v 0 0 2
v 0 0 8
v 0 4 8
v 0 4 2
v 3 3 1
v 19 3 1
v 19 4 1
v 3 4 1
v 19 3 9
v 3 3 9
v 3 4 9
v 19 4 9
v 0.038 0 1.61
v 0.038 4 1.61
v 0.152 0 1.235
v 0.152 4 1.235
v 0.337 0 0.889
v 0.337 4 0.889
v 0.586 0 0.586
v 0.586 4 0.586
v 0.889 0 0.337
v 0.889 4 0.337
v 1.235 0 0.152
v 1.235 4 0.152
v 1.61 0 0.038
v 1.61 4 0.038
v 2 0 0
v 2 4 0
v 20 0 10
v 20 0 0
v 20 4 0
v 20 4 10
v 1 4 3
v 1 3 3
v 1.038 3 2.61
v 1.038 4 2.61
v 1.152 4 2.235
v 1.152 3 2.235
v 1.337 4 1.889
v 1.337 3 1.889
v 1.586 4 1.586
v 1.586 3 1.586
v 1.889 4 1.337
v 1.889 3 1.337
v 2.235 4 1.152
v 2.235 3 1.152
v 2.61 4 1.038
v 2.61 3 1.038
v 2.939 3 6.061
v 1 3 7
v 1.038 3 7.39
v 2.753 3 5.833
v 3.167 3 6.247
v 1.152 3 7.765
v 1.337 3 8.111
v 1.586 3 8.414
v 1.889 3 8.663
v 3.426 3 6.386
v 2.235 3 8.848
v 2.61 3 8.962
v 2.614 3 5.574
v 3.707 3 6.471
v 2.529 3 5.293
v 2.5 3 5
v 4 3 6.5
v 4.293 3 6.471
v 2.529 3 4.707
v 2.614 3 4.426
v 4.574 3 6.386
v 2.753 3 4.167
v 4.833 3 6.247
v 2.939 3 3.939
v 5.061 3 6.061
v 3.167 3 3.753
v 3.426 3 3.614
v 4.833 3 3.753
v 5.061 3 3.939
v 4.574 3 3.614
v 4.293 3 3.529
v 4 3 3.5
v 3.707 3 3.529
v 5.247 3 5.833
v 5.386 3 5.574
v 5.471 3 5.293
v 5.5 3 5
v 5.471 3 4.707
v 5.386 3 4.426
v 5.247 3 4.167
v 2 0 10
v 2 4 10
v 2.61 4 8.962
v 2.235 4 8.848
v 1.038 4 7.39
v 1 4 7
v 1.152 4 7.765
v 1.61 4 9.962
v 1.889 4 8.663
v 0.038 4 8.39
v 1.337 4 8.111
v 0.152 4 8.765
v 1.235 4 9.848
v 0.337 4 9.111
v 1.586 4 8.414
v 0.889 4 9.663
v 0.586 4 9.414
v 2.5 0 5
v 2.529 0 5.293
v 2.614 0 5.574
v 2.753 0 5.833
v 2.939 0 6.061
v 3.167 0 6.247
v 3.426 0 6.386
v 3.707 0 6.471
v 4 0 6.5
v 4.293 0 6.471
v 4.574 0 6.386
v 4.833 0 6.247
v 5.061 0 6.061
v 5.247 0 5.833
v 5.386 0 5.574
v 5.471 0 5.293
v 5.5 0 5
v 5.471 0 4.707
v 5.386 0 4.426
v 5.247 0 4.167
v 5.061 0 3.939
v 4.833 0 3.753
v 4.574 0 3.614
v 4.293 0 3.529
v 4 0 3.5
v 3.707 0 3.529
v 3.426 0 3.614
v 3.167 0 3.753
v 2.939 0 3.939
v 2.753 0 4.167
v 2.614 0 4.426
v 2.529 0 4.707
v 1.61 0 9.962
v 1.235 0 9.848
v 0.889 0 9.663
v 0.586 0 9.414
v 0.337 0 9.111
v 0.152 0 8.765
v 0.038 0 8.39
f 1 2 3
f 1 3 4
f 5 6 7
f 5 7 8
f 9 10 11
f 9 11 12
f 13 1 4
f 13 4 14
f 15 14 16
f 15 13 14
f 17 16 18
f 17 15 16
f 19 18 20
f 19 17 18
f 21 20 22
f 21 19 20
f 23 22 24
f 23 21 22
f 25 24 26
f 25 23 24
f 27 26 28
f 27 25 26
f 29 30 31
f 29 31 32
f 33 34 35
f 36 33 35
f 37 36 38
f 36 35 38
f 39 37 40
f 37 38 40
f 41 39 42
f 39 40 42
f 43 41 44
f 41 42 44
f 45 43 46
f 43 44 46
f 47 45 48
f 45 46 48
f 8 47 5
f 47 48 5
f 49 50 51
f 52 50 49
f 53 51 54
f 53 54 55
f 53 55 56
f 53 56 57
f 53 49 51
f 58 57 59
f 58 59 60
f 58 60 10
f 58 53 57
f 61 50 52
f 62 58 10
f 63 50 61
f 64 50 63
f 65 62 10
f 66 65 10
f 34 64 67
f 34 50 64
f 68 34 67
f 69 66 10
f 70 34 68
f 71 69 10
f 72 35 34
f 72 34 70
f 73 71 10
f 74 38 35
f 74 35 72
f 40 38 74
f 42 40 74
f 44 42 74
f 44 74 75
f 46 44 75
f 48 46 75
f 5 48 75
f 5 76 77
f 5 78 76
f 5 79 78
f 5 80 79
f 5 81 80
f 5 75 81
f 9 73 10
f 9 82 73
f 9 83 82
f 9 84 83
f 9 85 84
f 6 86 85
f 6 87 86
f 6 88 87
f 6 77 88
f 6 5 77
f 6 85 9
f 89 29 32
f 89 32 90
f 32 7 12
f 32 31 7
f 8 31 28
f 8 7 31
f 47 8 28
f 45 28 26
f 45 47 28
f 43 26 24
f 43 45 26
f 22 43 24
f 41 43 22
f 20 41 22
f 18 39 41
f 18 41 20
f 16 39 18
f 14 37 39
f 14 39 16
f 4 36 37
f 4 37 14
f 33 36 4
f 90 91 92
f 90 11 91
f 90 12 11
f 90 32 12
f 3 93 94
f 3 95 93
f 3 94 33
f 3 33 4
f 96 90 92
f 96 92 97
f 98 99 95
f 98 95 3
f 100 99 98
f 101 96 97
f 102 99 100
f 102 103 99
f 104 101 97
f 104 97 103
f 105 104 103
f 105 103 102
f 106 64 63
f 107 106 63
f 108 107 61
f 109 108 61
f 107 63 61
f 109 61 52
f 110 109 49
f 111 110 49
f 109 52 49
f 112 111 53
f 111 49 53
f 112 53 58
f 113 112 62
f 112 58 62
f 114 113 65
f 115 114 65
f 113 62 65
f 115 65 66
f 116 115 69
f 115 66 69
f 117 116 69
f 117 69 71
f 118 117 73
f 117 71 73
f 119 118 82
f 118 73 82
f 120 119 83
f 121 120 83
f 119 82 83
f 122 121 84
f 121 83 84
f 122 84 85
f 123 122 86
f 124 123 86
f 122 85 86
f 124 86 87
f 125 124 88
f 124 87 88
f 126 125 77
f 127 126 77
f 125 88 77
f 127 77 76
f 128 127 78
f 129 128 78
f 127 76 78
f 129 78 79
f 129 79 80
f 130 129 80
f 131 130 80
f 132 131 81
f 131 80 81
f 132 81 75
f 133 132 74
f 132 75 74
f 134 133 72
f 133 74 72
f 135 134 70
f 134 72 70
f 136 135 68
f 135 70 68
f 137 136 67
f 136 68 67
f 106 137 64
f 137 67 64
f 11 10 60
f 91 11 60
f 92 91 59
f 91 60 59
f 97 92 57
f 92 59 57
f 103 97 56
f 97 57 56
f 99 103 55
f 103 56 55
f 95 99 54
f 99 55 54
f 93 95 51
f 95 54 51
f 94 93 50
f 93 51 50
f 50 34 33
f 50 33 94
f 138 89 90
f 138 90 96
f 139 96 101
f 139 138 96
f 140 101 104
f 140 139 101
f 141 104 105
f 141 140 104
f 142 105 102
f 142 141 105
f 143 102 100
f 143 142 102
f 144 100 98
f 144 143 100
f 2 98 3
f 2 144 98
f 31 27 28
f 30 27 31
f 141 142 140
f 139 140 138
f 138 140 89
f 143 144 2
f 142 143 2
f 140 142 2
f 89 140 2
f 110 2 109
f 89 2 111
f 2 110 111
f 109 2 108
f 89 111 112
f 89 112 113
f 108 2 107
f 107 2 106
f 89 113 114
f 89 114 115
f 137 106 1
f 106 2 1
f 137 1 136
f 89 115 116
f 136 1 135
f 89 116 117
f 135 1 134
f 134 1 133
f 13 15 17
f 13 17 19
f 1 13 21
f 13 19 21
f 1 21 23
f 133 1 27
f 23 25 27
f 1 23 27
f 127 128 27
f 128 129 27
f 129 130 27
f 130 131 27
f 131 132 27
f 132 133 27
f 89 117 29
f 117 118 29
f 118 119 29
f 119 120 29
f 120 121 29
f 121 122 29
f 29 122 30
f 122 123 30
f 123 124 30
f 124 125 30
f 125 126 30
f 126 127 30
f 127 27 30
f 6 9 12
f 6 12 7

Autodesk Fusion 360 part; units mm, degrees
sketch "Sketch1" plane through (0, 0, 0) normal (0, 1, 0) x (1, 0, 0)
  line L0 (2, 0) -> (20, 0)
  line L1 (20, 0) -> (20, -10)
  line L2 (20, -10) -> (2, -10)
  line L3 (0, -8) -> (0, -2)
  arc A0 (2, 0) -> (0, -2) centre (2, -2) ccw
  arc A1 (0, -8) -> (2, -10) centre (2, -8) ccw
  point P0 (0, -10)
  dimension "d1" = 10
  dimension "d2" = 20
  dimension "d12" = 2
extrude "Extrude1" add sketch "Sketch1" along normal blind 3
sketch "Sketch2" plane through (0, 3, 0) normal (0, 1, 0) x (-1, 0, 0)
  line L0 (-2, 10) -> (-20, 10)
  line L1 (-20, 10) -> (-20, 0)
  line L2 (-20, 0) -> (-2, 0)
  line L3 (0, 2) -> (0, 8)
  line L4 (-3, 9) -> (-19, 9)
  line L5 (-19, 9) -> (-19, 1)
  line L6 (-19, 1) -> (-3, 1)
  line L7 (-1, 3) -> (-1, 7)
  circle A0 centre (-4, 5) radius 1.5
  line L8 (0, 5) -> (-20, 5) construction
  line L9 (-11, 0) -> (-11, 10) construction
  arc A1 (-2, 0) -> (0, 2) centre (-2, 2) ccw
  arc A2 (0, 8) -> (-2, 10) centre (-2, 8) ccw
  arc A3 (-3, 1) -> (-1, 3) centre (-3, 3) ccw
  arc A4 (-1, 7) -> (-3, 9) centre (-3, 7) ccw
  dimension "d6" = 3
  dimension "d7" = 3
  dimension "d13" = 2
  dimension "d14" = 2
extrude "Extrude2" add sketch "Sketch2" along normal blind 1 contours L0 L1 L2 L3 A1 A2
extrude "Extrude3" cut sketch "Sketch2" against normal blind 3 contours A0
